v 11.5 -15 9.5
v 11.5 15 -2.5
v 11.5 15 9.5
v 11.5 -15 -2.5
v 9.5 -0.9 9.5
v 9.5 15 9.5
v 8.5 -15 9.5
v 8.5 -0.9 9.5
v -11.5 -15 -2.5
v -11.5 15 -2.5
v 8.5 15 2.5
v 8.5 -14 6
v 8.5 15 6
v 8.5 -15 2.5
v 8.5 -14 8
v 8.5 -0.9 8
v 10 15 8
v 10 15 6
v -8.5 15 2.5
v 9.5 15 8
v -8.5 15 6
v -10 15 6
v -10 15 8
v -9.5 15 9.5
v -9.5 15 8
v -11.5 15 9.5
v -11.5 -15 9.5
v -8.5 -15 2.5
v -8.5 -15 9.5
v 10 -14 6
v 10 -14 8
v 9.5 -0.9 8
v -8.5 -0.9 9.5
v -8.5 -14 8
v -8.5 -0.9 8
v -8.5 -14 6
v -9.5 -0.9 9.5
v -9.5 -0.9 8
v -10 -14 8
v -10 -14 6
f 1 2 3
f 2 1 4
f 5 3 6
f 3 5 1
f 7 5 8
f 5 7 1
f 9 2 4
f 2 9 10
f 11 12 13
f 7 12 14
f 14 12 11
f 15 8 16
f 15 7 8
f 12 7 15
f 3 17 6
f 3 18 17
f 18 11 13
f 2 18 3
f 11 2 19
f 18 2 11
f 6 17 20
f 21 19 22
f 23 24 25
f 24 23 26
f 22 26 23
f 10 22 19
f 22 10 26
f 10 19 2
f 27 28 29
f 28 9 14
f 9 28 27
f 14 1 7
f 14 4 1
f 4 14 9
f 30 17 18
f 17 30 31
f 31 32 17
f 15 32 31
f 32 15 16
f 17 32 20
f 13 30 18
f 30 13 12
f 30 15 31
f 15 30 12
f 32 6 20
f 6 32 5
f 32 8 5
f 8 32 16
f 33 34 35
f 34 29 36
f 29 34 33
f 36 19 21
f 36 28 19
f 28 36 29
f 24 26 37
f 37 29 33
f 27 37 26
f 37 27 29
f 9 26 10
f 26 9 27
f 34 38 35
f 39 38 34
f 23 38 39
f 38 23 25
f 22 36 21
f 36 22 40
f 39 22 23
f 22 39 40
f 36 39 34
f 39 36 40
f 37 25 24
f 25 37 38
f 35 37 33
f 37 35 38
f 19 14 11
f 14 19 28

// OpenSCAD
// file: ../robot_settings.scad
main_box_x = 100; // 96
main_box_y = 102;
main_box_z = 74; // 74.5

lfp_main_box_x = 65;
lfp_main_box_y = 151;
lfp_main_box_z = 95;

wall_thickness = 2;

rail_gap = 2;
rail_inset = 7;

rail_thickness = 7;
rail_length = 250;
rail_width = 250;

raspberry_pi_screw_seperation_y = 57;
raspberry_pi_screw_seperation_z = 48;
raspberry_pi_peg_h = 5;

battery_box_peg_h = 6;
battery_box_peg_d = 8;
battery_box_peg_cutout = 5;

gears_module = 1;
pinion_gear_teeth = 32;
pinion_gear_width = 5;
pinion_gear_bore = 8;

gears_setback_distance = 25;
gear_post_height = 2 * pinion_gear_width + rail_thickness + 8 ;

steering_motor_mount_x = 45;
steering_motor_mount_y = 36;
steering_motor_mount_z = 18;
steering_motor_mount_setback_distance = gears_setback_distance + 16;

dc_motor_drivertype = "Teyleten"; // Teyleten
isAdafruit = (dc_motor_drivertype == "Adafruit");

drv8871_x = isAdafruit ? 20.3 : 21.6;
drv8871_y = isAdafruit ?  24 : 25;

drv8871_z = 2;
drv8871_screw_d = 2.5;
drv8871_solder_points_z = 2;

drv8871mount_edge_x = 1.5;
drv8871mount_edge_wall = 3;
drv8871mount_z = 5;
drv8871mount_x = drv8871_x +  drv8871mount_edge_wall - 2* drv8871mount_edge_x;
drv8871mount_y = 19;

drv8871_screw_distance = 15.64;
drv8871_solder_points_d = 1.66;
drv8871_solder_offset_y = 4.4;
drv8871_solder_inner_points_distance = 5;
drv8871_solder_outer_points_distance = 12;

dc_motor_75_1_housing_minus_encoder_z = 53.8;
dc_motor_75_1_encoder_z = 14.75;
dc_motor_housing_minus_encoder_z = 48;
dc_motor_encoder_z = 9.33;
dc_motor_encoder_wheel_d = 13.4;
dc_motor_encoder_wheel_thickness = 5;
dc_motor_encoder_wheel_gap = 3;
dc_motor_encoder_circuit_thickness = 2;
dc_motor_cutout_d = 24.8;
dc_motor_cutout_z = 19.5;


M3_shaft_d = 2.82;

dc_motor_screw_head_z = 2;
dc_motor_screw_head_d = 5.6;
dc_motor_screw_d = 3.2;
dc_motor_screw_offset = 8.5;

dc_motor_axle_ring_z = 3;
dc_motor_axle_ring_d = 7.2;
dc_motor_axle_cutout_d = 4.2;
dc_motor_axle_cutout_z = 10;
dc_motor_axle_notch_cutout = 0.4;
dc_motor_axle_notch_cutout_z = 6;

pdmount_x = 20;
pdmount_y = 30;
pdmount_z = 2;
pdmount_edge_x = 1.5;
pdmount_edge_wall = 3;

steering_shaft_z = 45;
steering_shaft_d = 7;
steering_shaft_motor_fitting_d = 9;
coupler_length = 24.6;
coupler_diameter = 14;
coupler_screw_d = 4;
coupler_screw_z_offset = 5;
coupler_gear_side_insert = 12.6;
steering_shaft_with_coupler_z = steering_shaft_z - coupler_gear_side_insert;

lidar_mount_y = 110;
lidar_mount_x = 65 + 20;
lidar_narrow_screws = 40;
lidar_wide_screws = 56;
lidar_front_to_back_screws = 70;
lidar_screw_d = 3;
lidar_circuitboard_x = 20;
lidar_circuitboard_y = 35;
lidar_circuitboard_z = 1.2;
lidar_cord_length = 29;

ball_bearing_height = 7;
ball_bearing_outer_diameter = 22;
ball_bearing_inner_diameter = 8;

M4_diameter = 5.1;
M3_diameter = 2.9;
M3_length = 35;
M3_cap_length= 3;
M3_cap_diameter = 5.44;

suspension_spring_outer_diameter = 8;
suspension_spring_inner_diameter = 5.3;

armature_holder_height = 20;
armature_holder_thickness = 8;
pull_bar_peg_r = 3.2;
apparatus_locking_peg_d = 4;

rack_module = 1;
rack_length = main_box_x;
rack_height = 5;
rack_width = 10;
rack_teeth = 30;
rack_bore = 3;

pull_bar_length = rail_width / 2 - rack_length + 1;

// tire hardware
axle_length = 24 + ball_bearing_height; 
axle_reciever_inner_diameter = 8.2;
axle_reciever_outer_diameter = 12;
axle_reciever_length = 18.8;
axle_notch_length = 15;
axle_notch_cutout = 2.4;

// power distribution bar
power_bar_cutout_x = 96;
power_bar_y = 19.1;
power_bar_z = 1.5;
power_bar_screw_distance = 91.4;
power_bar_screw_d = 2.8;
power_bar_standoff_z = 5;
power_bar_standoff_d = 6.83;

pico_expander_width = 63;
pico_expander_height = 57;
pico_screw_hole_offset = 3;
pico_screw_hole_d = 2.5;

usbhub_thickness = 11.7;
usbhub_depth = 37.5;
usbhub_width = 86.7;
usbhub_end_port_width = 14.8;
usbhub_end_port_height = 12;
usbhub_front_face_safe_zone_left = 15;
usbhub_front_face_safe_zone_right = 14.8;

switch_w = 16;
switch_cutout_d = 12.2;
switch_bump_h = 2;
switch_bump_l = 18.2;

i2c_mount_thickness = 3;
i2c_w = 28;
i2c_l = 28;
i2c_circuitboard_thickness = 1.23;
i2c_bottom_notch_w = 14.35;
i2c_bottom_notch_depth = 1;
i2c_screw_hole_d = 1.9;
i2c_screw_hole_offset = 1.4;
i2c_pin_l = 11;
i2c_pin_d = 0.8;
i2c_pin_offset = 1.5;
i2c_pin_separation = 2.5;
i2c_all_pins_l = 8.3;
i2c_screen_thickness = 1.88;
i2c_screen_w = 14.6;
i2c_screen_d = 27;
i2c_screen_offset = 4.1;
// main file
include <../robot_settings.scad>
$fn = 50;

module pdmount()
{
  // base
  cube([pdmount_x, pdmount_y, pdmount_z + 3], center = true);
  
  // left wall and cutout for the circuit board
  difference() {
    translate([pdmount_x / 2, 0, 3.5])
    cube([drv8871mount_edge_wall, pdmount_y, pdmount_z + 10], center = true);
  
    translate([0, 1, drv8871mount_z + drv8871_solder_points_z])
    cube([pdmount_x, pdmount_y, pdmount_z], center = true);

    translate([0, 7.1, drv8871mount_z + drv8871_solder_points_z + 1.5])
    cube([pdmount_x - 1, pdmount_y - 14, pdmount_z + .1], center = true);
   }
  
 // right wall and cutout for the circuit board
 difference() {
    translate([-pdmount_x / 2, 0, 3.5])
    cube([drv8871mount_edge_wall, pdmount_y, pdmount_z + 10], center = true);
  
    translate([0, 1, drv8871mount_z + drv8871_solder_points_z])
    cube([pdmount_x, pdmount_y, pdmount_z], center = true);

    translate([0, 7.1, drv8871mount_z + drv8871_solder_points_z + 1.5])
    cube([pdmount_x - 1, pdmount_y - 14, pdmount_z + .1], center = true);
   } 
}

pdmount();
